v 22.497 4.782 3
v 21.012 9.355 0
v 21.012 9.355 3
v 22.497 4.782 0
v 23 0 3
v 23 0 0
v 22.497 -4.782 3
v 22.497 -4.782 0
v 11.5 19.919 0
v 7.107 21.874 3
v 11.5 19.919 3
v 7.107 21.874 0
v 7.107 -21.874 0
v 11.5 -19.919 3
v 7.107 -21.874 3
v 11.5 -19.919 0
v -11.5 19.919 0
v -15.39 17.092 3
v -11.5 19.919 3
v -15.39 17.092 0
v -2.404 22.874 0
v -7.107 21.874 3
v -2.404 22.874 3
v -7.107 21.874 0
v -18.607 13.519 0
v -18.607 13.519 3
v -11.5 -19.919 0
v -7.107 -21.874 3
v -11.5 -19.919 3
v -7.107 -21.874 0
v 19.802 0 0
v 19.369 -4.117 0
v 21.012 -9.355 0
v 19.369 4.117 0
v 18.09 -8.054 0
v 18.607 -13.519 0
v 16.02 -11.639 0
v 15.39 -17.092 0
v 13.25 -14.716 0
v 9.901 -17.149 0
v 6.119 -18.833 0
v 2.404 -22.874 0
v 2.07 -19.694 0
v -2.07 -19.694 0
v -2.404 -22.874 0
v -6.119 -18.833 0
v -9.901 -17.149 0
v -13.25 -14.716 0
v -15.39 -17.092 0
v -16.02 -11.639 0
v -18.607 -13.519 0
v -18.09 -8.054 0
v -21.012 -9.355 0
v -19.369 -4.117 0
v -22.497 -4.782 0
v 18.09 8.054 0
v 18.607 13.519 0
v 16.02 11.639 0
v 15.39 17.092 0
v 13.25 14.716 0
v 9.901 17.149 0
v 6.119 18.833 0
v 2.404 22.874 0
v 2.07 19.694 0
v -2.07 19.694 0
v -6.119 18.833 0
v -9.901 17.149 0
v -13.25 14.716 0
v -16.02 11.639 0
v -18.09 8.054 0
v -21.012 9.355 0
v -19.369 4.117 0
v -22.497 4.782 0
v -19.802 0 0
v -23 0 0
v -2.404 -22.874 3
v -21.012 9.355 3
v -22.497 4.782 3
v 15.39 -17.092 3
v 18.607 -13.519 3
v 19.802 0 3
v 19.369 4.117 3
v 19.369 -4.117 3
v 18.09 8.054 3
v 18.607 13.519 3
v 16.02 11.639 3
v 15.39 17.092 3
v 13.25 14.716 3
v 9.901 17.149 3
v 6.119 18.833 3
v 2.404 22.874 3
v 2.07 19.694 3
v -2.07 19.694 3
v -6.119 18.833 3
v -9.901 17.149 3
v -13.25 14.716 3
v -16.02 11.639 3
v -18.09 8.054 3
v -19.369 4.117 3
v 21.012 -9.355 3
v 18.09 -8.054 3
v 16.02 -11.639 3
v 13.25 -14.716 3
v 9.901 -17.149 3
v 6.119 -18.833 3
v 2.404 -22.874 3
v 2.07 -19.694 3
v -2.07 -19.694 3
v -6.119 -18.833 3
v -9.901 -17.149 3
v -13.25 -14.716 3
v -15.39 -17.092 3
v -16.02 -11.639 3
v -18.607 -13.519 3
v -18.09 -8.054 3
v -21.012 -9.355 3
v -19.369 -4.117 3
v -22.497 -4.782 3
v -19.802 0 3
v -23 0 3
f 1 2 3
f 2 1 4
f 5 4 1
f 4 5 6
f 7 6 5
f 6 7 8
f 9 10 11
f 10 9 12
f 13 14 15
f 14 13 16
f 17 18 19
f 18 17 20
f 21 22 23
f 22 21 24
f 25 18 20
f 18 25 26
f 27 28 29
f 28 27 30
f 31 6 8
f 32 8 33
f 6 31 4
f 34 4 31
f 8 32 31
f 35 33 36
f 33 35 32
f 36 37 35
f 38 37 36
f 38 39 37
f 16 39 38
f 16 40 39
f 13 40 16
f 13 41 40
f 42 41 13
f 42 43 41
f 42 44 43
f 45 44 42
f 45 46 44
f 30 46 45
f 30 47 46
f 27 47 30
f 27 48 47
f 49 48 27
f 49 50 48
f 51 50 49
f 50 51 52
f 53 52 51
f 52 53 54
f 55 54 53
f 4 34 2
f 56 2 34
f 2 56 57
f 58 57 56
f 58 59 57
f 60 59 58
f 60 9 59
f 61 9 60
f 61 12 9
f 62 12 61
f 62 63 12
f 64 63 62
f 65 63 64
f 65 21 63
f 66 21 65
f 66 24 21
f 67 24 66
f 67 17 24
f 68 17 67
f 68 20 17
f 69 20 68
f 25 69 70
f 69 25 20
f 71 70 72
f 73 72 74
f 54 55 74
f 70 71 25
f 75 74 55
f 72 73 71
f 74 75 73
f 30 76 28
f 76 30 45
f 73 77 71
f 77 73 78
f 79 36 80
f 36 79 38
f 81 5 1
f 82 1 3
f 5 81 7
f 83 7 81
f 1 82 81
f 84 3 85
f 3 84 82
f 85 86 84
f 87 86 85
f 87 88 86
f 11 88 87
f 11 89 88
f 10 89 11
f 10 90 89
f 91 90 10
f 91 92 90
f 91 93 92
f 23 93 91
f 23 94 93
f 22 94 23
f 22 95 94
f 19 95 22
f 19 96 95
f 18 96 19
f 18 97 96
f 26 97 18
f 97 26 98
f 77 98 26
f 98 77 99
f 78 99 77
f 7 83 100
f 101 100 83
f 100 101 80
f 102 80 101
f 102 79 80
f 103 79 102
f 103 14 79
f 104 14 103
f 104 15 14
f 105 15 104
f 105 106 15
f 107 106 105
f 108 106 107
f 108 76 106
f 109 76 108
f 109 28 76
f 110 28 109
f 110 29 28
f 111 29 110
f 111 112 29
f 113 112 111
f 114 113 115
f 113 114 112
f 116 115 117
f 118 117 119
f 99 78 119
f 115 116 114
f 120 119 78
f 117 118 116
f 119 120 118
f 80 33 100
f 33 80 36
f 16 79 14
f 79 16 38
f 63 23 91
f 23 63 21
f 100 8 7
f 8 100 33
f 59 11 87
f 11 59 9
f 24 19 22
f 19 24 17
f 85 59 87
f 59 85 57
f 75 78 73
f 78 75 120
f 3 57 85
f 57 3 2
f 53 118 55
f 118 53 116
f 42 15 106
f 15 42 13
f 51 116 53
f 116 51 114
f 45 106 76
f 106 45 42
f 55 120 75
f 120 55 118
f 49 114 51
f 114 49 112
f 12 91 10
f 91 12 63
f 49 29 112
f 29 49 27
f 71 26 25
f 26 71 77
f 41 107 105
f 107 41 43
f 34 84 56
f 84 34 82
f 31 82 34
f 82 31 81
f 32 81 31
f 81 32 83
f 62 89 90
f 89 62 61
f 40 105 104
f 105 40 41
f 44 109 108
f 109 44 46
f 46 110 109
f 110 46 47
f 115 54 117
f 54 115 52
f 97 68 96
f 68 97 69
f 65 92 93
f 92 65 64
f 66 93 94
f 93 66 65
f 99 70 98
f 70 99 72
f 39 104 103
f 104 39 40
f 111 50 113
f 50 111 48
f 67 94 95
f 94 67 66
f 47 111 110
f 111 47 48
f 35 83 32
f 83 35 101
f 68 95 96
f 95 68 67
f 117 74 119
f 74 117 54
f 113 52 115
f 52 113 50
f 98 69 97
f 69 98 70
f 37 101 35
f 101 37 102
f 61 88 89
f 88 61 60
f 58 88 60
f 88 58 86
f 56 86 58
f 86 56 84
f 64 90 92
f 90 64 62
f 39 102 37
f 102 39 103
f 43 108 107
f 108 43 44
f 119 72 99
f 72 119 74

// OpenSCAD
//Remixed by Shea Silverman - http://blog.sheasilverman.com
//keychain-Customizable Lithopane by Mark G. Peeters 
//http://www.thingiverse.com/thing:308109
//version 1.3 
//if you are using openSCAD then you are cool! You can get DAT files for local use using this tool
//http://customizer.makerbot.com/image_surface
// i used the nice code for adjusting layers from here:
//http://www.thingiverse.com/thing:74322

// preview[view:south, tilt:top]
//
//
/* [Image] */

// Load a 100x100 pixel image.(images will be stretched to fit) Simple photos work best. Don't forget to click the Invert Colors checkbox! *** ALSO IF YOU HAVE LETTERS IN YOUR IMAGE make sure to reverse the image before uploading so the letters are not backwards.
image_file = "image-surface.dat"; // [image_surface:100x100]

/* [Adjustments] */

//shape NOTE: ALL units are in millimeters (mm)
shape = 0;//[0:circle, 1:square]
//over all size of the keychain. you picked
tag_size = 40;// [20:70]

// What layer height will you slice this at?  The thinner the better.
layer_height = 0.1;
//Use plastic color opacity to set this. The lower the layer height, the more layers you can use. you picked
number_of_layers = 12; // [5:30]
//Width of border lining the keychain (3mm is fine)
border_width = 3;//
//border thickness lining the keychain (at least 3mm for strength)
border_thick = 3;//

/* [Hidden] */

// base (white) will always be 2 layers thick
min_layer_height = layer_height*2;
height = layer_height*number_of_layers;
maxheight = height+min_layer_height;


// Make litho and trim bottom and sides
  difference() { //diff 1
  translate([0, 0, min_layer_height]) scale([(tag_size/100),(tag_size/100),height]) surface(file=image_file, center=true, convexity=5); //litosurface moved up min_layer_height
  translate([0,0,-(maxheight)]) linear_extrude(height=maxheight) square(tag_size, center=true);//cutting bottom off surface

if (shape==0) {//you picked circle shape------------------------------------
difference() {  //diff make tube to trim lith
                translate([0, 0, -7]) cylinder(maxheight+15,r= tag_size); //outside
                translate([0, 0, -9]) cylinder(maxheight+18,r= (tag_size/2)); //inside
               } //end diff make tube
                //translate([0, tag_size/2+border_width, -1])cylinder(maxheight+2,r= ring_hole/2); //ring hole
}//end if you picked circle------------------------------------------



}//end diff 1

//add border and loop
if (shape==0) {//you picked circle shape--------------------------
//translate([0, tag_size/2+border_width, 0]) //move loop

//difference(){//make loop
//cylinder(border_thick,r=border_width+ring_hole/2); //ring support
//translate([0, 0, -1])cylinder(border_thick+2,r= ring_hole/2); //ring hole
//}

difference() {  //diff make frame tube
                 cylinder(border_thick,r= (tag_size/2)+border_width); //outside
                 cylinder(border_thick+1,r= (tag_size/2.02)); //inside
//translate([0, tag_size/2+border_width, -1])cylinder(border_thick+2,r= ring_hole/2); //ring hole
                } //end diff make frame tube

}//end if you picked circle------------------------------------------

if (shape==1) {//you picked square shape------------------------------------
translate([tag_size/2, tag_size/2, 0]) //move loop
difference(){//make loop
cylinder(border_thick,r=border_width+ring_hole/2); //ring support
translate([0, 0, -1])cylinder(border_thick+2,r= ring_hole/2); //ring hole
}

difference() {  //diff make frame tube
                 translate([0,0,border_thick/2]) cube([tag_size+border_width*2,tag_size+border_width*2,border_thick],center=true); //outside
                 translate([0,0,border_thick/2]) cube([tag_size-1,tag_size-1,border_thick+1],center=true); //inside
translate([tag_size/2, tag_size/2, -1])cylinder(border_thick+2,r= ring_hole/2); //ring hole                
                        } //end diff make frame tube
}//end if you picked square------------------------------------------------
